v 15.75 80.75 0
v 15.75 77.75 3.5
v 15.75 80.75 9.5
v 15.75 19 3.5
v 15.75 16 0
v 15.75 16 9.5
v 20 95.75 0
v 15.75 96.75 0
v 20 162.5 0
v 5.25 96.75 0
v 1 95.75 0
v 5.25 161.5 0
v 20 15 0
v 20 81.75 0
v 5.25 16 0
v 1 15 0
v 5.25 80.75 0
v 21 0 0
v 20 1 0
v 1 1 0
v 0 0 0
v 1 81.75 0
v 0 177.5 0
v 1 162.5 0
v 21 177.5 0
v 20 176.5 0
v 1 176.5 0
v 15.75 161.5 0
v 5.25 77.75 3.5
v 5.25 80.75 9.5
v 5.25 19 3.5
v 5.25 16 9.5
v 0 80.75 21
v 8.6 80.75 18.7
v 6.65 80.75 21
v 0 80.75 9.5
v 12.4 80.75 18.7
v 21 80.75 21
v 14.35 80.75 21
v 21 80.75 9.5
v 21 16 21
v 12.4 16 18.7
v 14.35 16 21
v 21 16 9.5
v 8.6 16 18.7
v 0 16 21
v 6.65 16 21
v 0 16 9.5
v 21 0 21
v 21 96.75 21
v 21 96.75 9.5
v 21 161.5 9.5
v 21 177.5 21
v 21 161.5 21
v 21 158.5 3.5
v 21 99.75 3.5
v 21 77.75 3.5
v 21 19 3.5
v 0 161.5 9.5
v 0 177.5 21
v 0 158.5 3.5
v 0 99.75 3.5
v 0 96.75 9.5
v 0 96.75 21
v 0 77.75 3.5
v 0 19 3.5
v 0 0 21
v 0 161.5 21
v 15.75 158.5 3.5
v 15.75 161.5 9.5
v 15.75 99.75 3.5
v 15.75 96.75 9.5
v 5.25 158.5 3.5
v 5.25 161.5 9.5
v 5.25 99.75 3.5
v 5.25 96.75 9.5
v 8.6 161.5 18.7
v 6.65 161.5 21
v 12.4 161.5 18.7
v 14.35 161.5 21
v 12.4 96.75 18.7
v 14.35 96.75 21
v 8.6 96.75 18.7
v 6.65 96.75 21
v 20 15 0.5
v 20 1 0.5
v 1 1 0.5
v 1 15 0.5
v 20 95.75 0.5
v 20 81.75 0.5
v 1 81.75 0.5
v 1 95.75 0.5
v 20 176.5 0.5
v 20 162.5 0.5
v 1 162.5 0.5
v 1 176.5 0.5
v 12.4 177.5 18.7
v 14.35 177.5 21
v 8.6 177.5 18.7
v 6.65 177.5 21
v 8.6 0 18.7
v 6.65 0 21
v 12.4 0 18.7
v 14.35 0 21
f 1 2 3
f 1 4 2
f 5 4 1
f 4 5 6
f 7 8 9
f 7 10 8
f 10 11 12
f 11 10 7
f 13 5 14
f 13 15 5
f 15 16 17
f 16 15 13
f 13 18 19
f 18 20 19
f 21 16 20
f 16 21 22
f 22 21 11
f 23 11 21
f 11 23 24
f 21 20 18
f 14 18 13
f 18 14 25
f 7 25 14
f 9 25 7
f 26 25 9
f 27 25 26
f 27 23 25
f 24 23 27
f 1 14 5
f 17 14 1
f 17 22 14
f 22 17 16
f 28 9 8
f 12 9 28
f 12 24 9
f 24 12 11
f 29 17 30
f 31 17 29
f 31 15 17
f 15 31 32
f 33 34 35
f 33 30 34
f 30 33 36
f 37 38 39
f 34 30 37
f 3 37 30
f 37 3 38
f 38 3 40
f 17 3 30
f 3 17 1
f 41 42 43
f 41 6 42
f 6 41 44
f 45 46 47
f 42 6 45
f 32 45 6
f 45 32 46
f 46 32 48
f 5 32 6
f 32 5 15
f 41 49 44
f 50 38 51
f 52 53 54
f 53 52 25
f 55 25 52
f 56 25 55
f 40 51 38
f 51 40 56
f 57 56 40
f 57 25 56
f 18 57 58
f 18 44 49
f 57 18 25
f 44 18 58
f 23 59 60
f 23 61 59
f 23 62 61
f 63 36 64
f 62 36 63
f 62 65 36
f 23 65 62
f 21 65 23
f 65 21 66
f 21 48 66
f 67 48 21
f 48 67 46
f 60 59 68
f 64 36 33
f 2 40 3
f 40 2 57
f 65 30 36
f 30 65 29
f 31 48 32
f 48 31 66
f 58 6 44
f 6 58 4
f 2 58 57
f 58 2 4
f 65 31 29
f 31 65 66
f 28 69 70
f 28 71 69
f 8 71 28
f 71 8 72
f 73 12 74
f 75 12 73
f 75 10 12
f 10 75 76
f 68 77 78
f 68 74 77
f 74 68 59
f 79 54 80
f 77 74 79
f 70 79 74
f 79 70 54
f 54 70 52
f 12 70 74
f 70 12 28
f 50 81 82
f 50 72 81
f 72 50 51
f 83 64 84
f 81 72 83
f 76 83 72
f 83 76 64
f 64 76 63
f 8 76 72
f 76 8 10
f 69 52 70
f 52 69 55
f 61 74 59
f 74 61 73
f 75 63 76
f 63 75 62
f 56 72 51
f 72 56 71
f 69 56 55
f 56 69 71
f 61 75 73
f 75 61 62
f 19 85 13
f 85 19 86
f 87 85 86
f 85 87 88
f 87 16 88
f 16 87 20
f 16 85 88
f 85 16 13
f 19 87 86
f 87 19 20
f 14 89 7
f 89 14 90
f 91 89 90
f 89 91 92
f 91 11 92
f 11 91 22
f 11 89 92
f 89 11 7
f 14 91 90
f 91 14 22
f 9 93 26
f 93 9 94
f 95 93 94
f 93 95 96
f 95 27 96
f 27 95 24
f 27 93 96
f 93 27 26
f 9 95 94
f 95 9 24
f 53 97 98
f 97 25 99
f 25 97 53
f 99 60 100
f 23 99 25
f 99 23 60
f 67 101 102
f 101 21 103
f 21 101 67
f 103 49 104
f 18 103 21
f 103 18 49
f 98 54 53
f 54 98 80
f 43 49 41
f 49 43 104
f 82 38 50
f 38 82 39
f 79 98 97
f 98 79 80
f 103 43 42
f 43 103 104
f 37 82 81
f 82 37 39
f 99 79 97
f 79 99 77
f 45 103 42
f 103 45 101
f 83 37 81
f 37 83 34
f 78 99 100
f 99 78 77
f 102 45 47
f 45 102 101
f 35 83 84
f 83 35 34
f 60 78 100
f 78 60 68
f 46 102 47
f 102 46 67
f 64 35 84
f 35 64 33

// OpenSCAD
// created by IndiePandaaaaa | Lukas

MODEL_TOLERANCE = 0.5;
PRINTER_SHEET_WIDTH = 200;

// Laptop Reference: Dell Inspiron 16 Plus 7610
laptop_width = 355;
laptop_rubber_higher_width = 7.2;
laptop_rubber_lower_width = 3.3;
laptop_rubber_height = 4.6;

standoff_width = laptop_width / 3 * 1.5;
standoff_count = 3;
standoff_height = 21;
standoff_brick_width = 16;
standoff_bottom_height = 3.5;

rubber_bottom_thickness = 0.5;
rubber_wall_thickness = 1;

chamfer = 3;

if (standoff_width > PRINTER_SHEET_WIDTH) {
    standoff_width = PRINTER_SHEET_WIDTH;
}

difference() {
    translate([0, standoff_width]) rotate([90, 0, 0])
        linear_extrude(standoff_width) {
            polygon([
                    [0, 0],
                    [standoff_height, 0],
                    [standoff_height, standoff_height],
                    [standoff_height - (standoff_height - laptop_rubber_higher_width - MODEL_TOLERANCE) / 2,
                        standoff_height - 0],
                    [standoff_height - (standoff_height - laptop_rubber_lower_width - MODEL_TOLERANCE) / 2,
                        standoff_height - laptop_rubber_height / 2],
                    [(standoff_height - laptop_rubber_lower_width - MODEL_TOLERANCE) / 2,
                        standoff_height - laptop_rubber_height / 2],
                    [(standoff_height - laptop_rubber_higher_width - MODEL_TOLERANCE) / 2, standoff_height],
                    [0, standoff_height],
                ]);
        }

    width_between = (standoff_width - (standoff_brick_width * standoff_count)) / (standoff_count - 1);
    for (i = [1:standoff_count - 1]) {
        translate([0, standoff_brick_width + (width_between + standoff_brick_width) * (i - 1), standoff_bottom_height])
            {
                translate([standoff_height / 4, 0, - standoff_bottom_height])
                    cube([standoff_height / 2, width_between, standoff_height]);

                rotate([90, 0, 90]) {
                    linear_extrude(standoff_height) {
                        polygon([
                                [0, chamfer * 2],
                                [chamfer, 0],
                                [width_between - chamfer, 0],
                                [width_between, chamfer * 2],
                                [width_between, standoff_height],
                                [0, standoff_height],
                            ]);
                    }
                }
            }
    }

    for (i = [1:standoff_count]) {
        translate([rubber_wall_thickness, rubber_wall_thickness + (width_between + standoff_brick_width) * (i - 1), 0])
            cube([standoff_height - rubber_wall_thickness * 2, standoff_brick_width - rubber_wall_thickness * 2,
                rubber_bottom_thickness]);
    }
}
